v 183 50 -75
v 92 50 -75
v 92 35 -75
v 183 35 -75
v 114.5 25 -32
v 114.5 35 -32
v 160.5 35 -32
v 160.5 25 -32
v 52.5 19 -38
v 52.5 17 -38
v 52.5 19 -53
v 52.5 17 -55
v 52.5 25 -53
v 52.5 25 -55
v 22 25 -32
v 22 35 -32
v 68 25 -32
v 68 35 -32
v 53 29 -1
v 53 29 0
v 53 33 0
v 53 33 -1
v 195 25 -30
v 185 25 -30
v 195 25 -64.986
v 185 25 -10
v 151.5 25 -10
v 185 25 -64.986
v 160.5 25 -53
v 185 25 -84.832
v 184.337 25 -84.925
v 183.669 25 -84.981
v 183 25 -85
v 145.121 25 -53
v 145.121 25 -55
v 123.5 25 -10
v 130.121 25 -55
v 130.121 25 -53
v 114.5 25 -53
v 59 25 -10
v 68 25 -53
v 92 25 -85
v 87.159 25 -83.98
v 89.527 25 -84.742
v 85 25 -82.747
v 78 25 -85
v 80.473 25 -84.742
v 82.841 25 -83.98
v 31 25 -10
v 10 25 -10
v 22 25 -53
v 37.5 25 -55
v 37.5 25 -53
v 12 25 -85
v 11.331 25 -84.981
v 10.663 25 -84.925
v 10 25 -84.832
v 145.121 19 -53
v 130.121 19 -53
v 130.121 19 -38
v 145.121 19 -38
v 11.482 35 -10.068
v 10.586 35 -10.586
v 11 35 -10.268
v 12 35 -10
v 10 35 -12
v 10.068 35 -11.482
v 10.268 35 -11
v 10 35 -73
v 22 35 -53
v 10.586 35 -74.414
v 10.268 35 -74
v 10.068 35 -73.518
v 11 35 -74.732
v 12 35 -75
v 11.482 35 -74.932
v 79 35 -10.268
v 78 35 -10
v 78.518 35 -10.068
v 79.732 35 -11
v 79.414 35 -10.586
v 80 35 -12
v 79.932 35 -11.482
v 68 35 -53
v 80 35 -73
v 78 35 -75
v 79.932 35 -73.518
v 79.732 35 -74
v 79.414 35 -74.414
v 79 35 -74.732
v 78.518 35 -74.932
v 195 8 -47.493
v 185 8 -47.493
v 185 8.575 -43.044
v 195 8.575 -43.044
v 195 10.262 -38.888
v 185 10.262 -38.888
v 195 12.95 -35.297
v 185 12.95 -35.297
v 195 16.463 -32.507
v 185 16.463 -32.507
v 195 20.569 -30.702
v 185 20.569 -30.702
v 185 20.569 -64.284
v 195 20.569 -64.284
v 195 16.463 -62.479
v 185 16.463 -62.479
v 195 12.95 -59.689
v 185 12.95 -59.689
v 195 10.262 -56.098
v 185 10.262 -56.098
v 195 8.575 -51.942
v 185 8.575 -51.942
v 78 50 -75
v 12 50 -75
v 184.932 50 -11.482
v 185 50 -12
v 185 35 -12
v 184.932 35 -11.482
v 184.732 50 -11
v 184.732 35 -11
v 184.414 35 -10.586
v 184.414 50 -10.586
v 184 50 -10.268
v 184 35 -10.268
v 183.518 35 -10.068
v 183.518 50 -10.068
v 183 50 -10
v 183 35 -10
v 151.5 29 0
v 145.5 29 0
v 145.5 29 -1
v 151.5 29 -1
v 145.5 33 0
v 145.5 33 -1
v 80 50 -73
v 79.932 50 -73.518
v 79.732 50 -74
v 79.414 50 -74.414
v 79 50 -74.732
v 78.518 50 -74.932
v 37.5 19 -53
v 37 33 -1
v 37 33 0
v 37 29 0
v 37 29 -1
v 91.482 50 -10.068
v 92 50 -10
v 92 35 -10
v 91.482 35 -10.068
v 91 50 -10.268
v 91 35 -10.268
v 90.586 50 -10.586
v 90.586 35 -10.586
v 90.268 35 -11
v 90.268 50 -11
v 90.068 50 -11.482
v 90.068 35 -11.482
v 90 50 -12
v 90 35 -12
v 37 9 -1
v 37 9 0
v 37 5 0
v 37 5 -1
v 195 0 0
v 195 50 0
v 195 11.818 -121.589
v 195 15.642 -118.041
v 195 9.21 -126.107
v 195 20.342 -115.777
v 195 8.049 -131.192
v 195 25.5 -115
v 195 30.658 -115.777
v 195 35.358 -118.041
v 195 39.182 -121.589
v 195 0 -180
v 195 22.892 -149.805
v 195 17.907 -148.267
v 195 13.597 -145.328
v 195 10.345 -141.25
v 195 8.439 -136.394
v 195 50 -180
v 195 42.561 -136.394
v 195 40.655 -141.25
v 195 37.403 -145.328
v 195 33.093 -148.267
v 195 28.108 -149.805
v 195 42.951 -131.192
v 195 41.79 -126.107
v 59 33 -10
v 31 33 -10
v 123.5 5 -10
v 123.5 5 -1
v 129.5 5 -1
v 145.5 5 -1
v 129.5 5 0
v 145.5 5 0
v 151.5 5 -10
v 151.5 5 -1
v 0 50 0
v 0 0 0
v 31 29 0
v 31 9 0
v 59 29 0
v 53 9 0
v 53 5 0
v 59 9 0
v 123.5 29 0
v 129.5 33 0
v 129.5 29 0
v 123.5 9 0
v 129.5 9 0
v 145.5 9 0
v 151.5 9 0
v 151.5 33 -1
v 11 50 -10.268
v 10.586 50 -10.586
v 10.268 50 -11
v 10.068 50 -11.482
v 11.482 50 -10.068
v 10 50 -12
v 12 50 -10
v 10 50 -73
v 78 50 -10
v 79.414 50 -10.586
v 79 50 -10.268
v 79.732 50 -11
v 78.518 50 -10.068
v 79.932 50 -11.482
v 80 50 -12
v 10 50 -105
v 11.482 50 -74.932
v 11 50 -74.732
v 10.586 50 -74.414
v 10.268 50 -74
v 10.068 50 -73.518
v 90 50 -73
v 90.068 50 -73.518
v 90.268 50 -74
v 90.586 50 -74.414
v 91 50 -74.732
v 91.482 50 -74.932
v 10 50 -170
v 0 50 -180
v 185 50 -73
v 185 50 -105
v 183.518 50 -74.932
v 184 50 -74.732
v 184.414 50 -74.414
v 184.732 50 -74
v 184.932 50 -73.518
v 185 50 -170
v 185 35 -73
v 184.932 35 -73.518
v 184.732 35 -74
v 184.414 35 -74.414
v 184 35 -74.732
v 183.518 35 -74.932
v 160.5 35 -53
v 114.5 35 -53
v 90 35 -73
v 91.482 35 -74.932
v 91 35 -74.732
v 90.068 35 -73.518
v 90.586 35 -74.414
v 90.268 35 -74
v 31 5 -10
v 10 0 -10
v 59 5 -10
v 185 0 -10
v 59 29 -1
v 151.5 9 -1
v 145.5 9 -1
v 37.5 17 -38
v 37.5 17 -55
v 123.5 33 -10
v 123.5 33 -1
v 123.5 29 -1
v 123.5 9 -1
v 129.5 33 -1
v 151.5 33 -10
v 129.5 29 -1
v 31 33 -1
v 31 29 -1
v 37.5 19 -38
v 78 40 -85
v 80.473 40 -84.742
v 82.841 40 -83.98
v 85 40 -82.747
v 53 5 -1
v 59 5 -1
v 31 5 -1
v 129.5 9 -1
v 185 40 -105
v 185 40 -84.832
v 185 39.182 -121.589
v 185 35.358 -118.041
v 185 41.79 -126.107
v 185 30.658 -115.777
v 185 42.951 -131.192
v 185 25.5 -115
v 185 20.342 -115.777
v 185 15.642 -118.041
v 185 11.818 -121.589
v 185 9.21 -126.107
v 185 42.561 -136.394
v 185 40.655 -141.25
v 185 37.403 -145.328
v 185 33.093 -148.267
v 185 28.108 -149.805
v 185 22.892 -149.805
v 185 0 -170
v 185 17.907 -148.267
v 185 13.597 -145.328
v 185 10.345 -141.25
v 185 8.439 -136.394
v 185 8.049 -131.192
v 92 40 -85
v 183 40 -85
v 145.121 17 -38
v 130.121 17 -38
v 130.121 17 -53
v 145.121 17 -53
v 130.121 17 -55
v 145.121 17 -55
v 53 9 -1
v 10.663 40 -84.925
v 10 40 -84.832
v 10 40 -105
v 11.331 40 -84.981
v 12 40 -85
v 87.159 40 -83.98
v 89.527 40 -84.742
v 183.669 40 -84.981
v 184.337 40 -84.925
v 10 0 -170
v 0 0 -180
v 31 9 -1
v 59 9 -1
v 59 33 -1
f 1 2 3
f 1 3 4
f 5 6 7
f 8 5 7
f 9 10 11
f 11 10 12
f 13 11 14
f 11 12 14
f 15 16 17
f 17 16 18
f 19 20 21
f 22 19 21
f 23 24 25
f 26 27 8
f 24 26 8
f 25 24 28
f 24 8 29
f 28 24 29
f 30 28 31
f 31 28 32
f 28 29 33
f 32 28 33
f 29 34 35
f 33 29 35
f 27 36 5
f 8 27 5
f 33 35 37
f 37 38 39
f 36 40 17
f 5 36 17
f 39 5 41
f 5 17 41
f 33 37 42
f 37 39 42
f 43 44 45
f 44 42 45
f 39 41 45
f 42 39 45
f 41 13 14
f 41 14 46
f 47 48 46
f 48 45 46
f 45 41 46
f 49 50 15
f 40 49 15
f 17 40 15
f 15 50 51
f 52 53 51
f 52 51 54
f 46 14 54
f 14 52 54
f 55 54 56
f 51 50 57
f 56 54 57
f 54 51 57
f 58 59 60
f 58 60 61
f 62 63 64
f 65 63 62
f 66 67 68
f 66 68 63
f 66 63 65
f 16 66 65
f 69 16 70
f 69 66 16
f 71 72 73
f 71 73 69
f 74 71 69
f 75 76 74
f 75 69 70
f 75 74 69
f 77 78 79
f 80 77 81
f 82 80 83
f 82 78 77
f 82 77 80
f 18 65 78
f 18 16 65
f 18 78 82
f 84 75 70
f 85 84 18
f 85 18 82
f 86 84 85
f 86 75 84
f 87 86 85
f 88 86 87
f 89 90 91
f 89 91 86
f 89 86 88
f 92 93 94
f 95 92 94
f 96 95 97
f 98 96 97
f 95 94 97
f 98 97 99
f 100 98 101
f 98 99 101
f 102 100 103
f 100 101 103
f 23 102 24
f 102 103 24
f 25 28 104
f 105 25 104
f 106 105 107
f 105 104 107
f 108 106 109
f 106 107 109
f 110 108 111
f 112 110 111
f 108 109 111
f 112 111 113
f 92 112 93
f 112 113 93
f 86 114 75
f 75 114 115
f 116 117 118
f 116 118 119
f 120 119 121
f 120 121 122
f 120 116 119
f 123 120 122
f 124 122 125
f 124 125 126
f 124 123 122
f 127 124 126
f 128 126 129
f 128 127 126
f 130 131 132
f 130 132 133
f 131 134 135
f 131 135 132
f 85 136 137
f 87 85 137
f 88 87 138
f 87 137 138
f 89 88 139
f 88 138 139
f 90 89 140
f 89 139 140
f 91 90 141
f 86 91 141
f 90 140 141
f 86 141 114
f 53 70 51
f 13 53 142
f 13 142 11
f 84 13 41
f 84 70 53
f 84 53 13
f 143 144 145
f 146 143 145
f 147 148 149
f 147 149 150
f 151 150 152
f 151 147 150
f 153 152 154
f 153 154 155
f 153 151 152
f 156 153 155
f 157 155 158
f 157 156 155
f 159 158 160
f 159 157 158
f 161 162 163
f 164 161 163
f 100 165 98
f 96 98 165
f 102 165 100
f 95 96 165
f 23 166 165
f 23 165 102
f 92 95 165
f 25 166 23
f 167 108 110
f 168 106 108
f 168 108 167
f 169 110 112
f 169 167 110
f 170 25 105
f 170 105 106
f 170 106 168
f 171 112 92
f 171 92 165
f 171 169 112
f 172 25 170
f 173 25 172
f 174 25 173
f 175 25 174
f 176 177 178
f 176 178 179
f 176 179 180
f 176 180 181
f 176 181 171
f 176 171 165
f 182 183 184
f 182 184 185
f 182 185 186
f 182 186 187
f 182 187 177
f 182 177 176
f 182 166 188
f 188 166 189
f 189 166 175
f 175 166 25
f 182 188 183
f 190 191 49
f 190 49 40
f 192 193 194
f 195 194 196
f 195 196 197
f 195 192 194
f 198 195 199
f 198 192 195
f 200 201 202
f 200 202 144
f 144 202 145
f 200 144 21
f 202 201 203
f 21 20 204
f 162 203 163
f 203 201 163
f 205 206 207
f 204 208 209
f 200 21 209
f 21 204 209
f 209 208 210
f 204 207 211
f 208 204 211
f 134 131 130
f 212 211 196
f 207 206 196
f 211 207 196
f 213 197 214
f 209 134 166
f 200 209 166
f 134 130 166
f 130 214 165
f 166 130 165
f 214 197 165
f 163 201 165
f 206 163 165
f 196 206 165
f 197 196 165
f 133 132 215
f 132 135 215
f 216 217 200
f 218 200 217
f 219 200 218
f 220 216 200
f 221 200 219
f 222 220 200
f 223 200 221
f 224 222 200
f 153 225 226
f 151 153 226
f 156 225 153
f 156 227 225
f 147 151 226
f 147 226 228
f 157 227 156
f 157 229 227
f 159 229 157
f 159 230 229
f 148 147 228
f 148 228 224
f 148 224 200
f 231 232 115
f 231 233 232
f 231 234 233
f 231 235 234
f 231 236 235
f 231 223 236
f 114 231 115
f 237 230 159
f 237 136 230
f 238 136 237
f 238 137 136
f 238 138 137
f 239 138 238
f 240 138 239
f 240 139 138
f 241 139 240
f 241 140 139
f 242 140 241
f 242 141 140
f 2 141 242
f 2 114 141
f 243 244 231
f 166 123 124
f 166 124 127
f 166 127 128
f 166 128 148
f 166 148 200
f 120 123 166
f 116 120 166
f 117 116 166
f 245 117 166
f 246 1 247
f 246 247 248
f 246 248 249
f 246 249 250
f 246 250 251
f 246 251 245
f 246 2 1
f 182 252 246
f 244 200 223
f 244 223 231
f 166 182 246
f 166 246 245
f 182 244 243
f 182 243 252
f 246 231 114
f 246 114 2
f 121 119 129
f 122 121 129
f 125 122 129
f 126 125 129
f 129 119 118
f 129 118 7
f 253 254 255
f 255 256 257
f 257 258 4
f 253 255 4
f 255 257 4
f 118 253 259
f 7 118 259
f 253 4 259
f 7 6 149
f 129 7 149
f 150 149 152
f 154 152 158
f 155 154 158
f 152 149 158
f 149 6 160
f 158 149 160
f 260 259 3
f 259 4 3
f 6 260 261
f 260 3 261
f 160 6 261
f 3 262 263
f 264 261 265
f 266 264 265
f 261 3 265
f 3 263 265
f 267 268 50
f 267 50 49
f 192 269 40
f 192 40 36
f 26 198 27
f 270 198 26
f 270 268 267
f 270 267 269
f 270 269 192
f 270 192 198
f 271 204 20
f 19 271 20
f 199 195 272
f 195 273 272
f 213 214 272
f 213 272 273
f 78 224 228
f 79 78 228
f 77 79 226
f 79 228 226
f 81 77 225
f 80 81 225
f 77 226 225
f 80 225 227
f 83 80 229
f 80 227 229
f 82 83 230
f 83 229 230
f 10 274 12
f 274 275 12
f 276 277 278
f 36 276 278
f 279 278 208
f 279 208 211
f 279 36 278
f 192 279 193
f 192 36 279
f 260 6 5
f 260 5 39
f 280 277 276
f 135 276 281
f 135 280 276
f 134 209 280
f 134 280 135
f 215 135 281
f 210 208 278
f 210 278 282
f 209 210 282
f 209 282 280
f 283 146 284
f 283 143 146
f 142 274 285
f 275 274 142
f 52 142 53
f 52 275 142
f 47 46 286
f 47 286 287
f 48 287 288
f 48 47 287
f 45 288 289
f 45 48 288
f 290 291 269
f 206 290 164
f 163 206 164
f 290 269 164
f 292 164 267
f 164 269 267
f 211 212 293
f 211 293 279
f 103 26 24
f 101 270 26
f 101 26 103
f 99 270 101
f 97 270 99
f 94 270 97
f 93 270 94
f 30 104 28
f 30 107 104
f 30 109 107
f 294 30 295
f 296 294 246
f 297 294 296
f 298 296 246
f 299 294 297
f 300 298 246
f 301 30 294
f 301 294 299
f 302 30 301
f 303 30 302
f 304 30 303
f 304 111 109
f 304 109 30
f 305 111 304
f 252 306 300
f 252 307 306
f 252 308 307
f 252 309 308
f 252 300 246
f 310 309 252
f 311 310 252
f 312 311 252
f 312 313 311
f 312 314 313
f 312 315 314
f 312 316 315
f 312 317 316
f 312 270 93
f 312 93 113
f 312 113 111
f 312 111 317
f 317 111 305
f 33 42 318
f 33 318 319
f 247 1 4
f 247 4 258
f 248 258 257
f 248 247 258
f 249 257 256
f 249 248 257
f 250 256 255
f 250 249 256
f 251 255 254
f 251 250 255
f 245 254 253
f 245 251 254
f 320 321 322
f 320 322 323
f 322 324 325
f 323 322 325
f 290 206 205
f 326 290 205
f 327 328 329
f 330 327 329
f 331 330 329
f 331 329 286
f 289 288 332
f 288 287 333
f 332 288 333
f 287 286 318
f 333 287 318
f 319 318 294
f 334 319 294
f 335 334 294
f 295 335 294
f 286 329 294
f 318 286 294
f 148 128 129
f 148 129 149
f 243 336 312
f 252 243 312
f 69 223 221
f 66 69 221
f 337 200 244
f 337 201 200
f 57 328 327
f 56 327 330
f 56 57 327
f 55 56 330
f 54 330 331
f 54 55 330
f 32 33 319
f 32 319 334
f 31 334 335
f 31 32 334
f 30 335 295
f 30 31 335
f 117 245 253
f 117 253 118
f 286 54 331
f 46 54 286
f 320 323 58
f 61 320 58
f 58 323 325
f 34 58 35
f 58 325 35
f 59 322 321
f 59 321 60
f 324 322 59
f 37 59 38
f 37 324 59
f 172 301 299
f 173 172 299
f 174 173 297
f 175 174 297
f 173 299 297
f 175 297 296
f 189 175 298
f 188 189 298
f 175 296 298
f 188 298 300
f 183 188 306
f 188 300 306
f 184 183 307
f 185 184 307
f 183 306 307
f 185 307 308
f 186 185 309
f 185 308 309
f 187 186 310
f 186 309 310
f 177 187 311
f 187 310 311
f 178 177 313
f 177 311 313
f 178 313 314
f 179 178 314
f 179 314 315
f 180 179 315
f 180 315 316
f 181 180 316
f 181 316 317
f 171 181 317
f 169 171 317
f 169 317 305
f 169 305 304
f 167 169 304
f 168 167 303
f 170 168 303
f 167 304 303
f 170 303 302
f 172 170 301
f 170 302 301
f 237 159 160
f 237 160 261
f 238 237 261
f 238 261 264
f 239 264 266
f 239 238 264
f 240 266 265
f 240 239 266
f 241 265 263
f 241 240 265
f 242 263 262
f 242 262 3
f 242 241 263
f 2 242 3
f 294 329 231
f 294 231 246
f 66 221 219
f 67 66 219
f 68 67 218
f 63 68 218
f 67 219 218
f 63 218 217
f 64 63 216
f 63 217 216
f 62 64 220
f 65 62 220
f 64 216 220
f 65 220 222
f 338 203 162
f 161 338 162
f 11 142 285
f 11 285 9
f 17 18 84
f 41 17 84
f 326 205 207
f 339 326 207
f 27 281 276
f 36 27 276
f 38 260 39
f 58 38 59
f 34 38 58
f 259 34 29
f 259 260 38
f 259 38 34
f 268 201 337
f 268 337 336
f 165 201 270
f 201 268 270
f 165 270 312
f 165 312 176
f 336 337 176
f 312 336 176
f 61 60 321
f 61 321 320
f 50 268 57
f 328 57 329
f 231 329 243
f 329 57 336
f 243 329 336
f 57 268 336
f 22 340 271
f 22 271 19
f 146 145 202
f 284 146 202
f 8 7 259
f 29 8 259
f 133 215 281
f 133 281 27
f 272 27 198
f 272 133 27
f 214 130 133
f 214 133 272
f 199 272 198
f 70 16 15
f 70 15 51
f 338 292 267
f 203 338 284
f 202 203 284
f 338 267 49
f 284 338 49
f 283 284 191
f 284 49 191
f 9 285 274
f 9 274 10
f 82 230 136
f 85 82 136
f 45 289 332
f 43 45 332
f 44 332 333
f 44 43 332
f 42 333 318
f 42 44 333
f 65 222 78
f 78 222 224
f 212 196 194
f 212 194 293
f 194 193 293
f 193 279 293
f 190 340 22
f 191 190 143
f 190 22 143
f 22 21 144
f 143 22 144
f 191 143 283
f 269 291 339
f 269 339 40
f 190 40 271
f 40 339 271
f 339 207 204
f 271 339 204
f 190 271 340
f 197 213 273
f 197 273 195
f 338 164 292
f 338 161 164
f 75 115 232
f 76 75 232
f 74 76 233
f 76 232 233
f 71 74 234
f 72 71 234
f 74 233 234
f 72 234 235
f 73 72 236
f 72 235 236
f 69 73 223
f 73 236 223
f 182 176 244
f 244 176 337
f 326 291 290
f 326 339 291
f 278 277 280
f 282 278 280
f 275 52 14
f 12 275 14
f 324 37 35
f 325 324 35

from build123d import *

# Parameters (mm, degrees)
SKETCH2_W            = 195
SKETCH2_H            = 180
BOSS_EXTRUDE1_DEPTH  = 50
CUT_EXTRUDE1_DEPTH   = 15
BOSS_EXTRUDE4_DEPTH  = 50
SKETCH14_W           = 70
SKETCH14_H           = 65
SKETCH14_W_2         = 95
BOSS_EXTRUDE8_DEPTH  = 35
SHELL2_OUTLINE_W     = 175
SHELL2_OUTLINE_H     = 65
SHELL2_DEPTH         = 75
SHELL2_2_OUTLINE_W   = 175
SHELL2_2_OUTLINE_H   = 95
SHELL2_2_DEPTH       = 25
SHELL2_START         = 25
SHELL2_3_DEPTH       = 15
SKETCH15_W           = 46
SKETCH15_H           = 21
CUT_EXTRUDE2_DEPTH   = 10
SKETCH16_W           = 46
SKETCH16_H           = 21
CUT_EXTRUDE3_DEPTH   = 10
SKETCH17_W           = 7.5
SKETCH17_H           = 8
BOSS_EXTRUDE10_DEPTH = 2
SKETCH18_W           = 15
SKETCH18_H           = 2
BOSS_EXTRUDE11_DEPTH = 15
CUT_EXTRUDE5_DEPTH   = 10
CUT_EXTRUDE6_DEPTH   = 9
SKETCH25_W           = 7.379331851
SKETCH25_H           = 8
SKETCH25_W_2         = 7.620668149
BOSS_EXTRUDE12_DEPTH = 2
SKETCH26_W           = 15
SKETCH26_H           = 2
BOSS_EXTRUDE13_DEPTH = 15
SKETCH27_R           = 17.5
CUT_EXTRUDE10_DEPTH  = 10
BOSS_EXTRUDE14_START = -10
BOSS_EXTRUDE14_DEPTH = 10


# Read off the part's stored shape, not the designer's step: Shell2
with BuildPart() as part:
    # Sketch2 → Boss-Extrude1 (new body)
    with BuildSketch(Plane(origin=(0, 0, 0), x_dir=(1, 0, 0), z_dir=(0, 1, 0))):
        with Locations((97.5, 90)):
            Rectangle(SKETCH2_W, SKETCH2_H)
    extrude(amount=BOSS_EXTRUDE1_DEPTH)

    # Sketch3 → Cut-Extrude1 (cut)
    with BuildSketch(Plane(origin=(0, 50, 0), x_dir=(1, 0, 0), z_dir=(0, 1, 0))):
        with BuildLine():
            Line((90, 12), (90, 73))
            ThreePointArc((90, 73), (90.585786438, 74.414213562), (92, 75))
            Line((92, 75), (183, 75))
            ThreePointArc((183, 75), (184.414213562, 74.414213562), (185, 73))
            Line((185, 73), (185, 12))
            ThreePointArc((185, 12), (184.414213562, 10.585786438), (183, 10))
            Line((183, 10), (92, 10))
            ThreePointArc((92, 10), (90.585786438, 10.585786438), (90, 12))
        make_face()
        with BuildLine():
            Line((12, 10), (78, 10))
            ThreePointArc((78, 10), (79.414213562, 10.585786438), (80, 12))
            Line((80, 12), (80, 73))
            ThreePointArc((80, 73), (79.414213562, 74.414213562), (78, 75))
            Line((78, 75), (12, 75))
            ThreePointArc((12, 75), (10.585786438, 74.414213562), (10, 73))
            Line((10, 73), (10, 12))
            ThreePointArc((10, 12), (10.585786438, 10.585786438), (12, 10))
        make_face()
    extrude(amount=-CUT_EXTRUDE1_DEPTH, mode=Mode.SUBTRACT)

    # Sketch6 → Boss-Extrude4 (add)
    with BuildSketch(Plane(origin=(0, 50, 0), x_dir=(1, 0, 0), z_dir=(0, 1, 0))):
        Polygon((0, 180), (185, 180), (195, 180), (195, 95), (185, 95), (0, 95), align=None)
        with BuildLine():
            Line((185, 168), (185, 107))
            ThreePointArc((185, 107), (184.414213562, 105.585786438), (183, 105))
            Line((183, 105), (92, 105))
            ThreePointArc((92, 105), (90.585786438, 105.585786438), (90, 107))
            Line((90, 107), (90, 168))
            ThreePointArc((90, 168), (90.585786438, 169.414213562), (92, 170))
            Line((92, 170), (183, 170))
            ThreePointArc((183, 170), (184.414213562, 169.414213562), (185, 168))
        make_face(mode=Mode.SUBTRACT)
        with BuildLine():
            Line((80, 107), (80, 168))
            ThreePointArc((80, 168), (79.414213562, 169.414213562), (78, 170))
            Line((78, 170), (12, 170))
            ThreePointArc((12, 170), (10.585786438, 169.414213562), (10, 168))
            Line((10, 168), (10, 107))
            ThreePointArc((10, 107), (10.585786438, 105.585786438), (12, 105))
            Line((12, 105), (78, 105))
            ThreePointArc((78, 105), (79.414213562, 105.585786438), (80, 107))
        make_face(mode=Mode.SUBTRACT)
    extrude(amount=BOSS_EXTRUDE4_DEPTH)

    # Sketch14 → Boss-Extrude8 (add)
    with BuildSketch(Plane(origin=(0, 50, 0), x_dir=(1, 0, 0), z_dir=(0, 1, 0))):
        with Locations((45, 137.5)):
            Rectangle(SKETCH14_W, SKETCH14_H)
        with Locations((137.5, 137.5)):
            Rectangle(SKETCH14_W_2, SKETCH14_H)
    extrude(amount=BOSS_EXTRUDE8_DEPTH)

    # Shell2 outline → Shell2 (cut)
    with BuildSketch(Plane(origin=(0, 0, 0), x_dir=(1, 0, 0), z_dir=(0, 1, 0))):
        with Locations((97.5, 137.5)):
            Rectangle(SHELL2_OUTLINE_W, SHELL2_OUTLINE_H)
    extrude(amount=SHELL2_DEPTH, mode=Mode.SUBTRACT)

    # Shell2 2 outline → Shell2 2 (cut)
    with BuildSketch(Plane(origin=(0, 0, 0), x_dir=(1, 0, 0), z_dir=(0, 1, 0))):
        with Locations((97.5, 57.5)):
            Rectangle(SHELL2_2_OUTLINE_W, SHELL2_2_OUTLINE_H)
    extrude(amount=SHELL2_2_DEPTH, mode=Mode.SUBTRACT)

    # Shell2 3 outline → Shell2 3 (cut)
    with BuildSketch(Plane(origin=(0, 0, 0), x_dir=(1, 0, 0), z_dir=(0, 1, 0)).offset(SHELL2_START)):
        with BuildLine():
            Line((10, 105), (10, 84.832159566))
            ThreePointArc((10, 84.832159566), (10.996484877, 84.957966273), (12, 85))
            Line((12, 85), (78, 85))
            ThreePointArc((78, 85), (81.676851089, 84.422817781), (85, 82.746794345))
            ThreePointArc((85, 82.746794345), (88.323148911, 84.422817781), (92, 85))
            Line((92, 85), (183, 85))
            ThreePointArc((183, 85), (184.003515123, 84.957966273), (185, 84.832159566))
            Line((185, 84.832159566), (185, 105))
            Line((185, 105), (10, 105))
        make_face()
    extrude(amount=SHELL2_3_DEPTH, mode=Mode.SUBTRACT)

    # SurfaceCut2
    split(bisect_by=Plane(origin=(0, 50, 0), x_dir=(1, 0, 0), z_dir=(0, 1, 0)), keep=Keep.BOTTOM)

    # Sketch15 → Cut-Extrude2 (cut)
    with BuildSketch(Plane(origin=(0, 35, 0), x_dir=(1, 0, 0), z_dir=(0, 1, 0))):
        with Locations((45, 42.5)):
            Rectangle(SKETCH15_W, SKETCH15_H)
    extrude(amount=-CUT_EXTRUDE2_DEPTH, mode=Mode.SUBTRACT)

    # Sketch16 → Cut-Extrude3 (cut)
    with BuildSketch(Plane(origin=(0, 35, 0), x_dir=(1, 0, 0), z_dir=(0, 1, 0))):
        with Locations((137.5, 42.5)):
            Rectangle(SKETCH16_W, SKETCH16_H)
    extrude(amount=-CUT_EXTRUDE3_DEPTH, mode=Mode.SUBTRACT)

    # Sketch17 → Boss-Extrude10 (add)
    with BuildSketch(Plane.XY.offset(-53)):
        with Locations((48.75, 21)):
            Rectangle(SKETCH17_W, SKETCH17_H)
        with Locations((41.25, 21)):
            Rectangle(SKETCH17_W, SKETCH17_H)
    extrude(amount=-BOSS_EXTRUDE10_DEPTH)

    # Sketch18 → Boss-Extrude11 (add)
    with BuildSketch(Plane.XY.offset(-53)):
        with Locations((45, 18)):
            Rectangle(SKETCH18_W, SKETCH18_H)
    extrude(amount=BOSS_EXTRUDE11_DEPTH)

    # Sketch20 → Cut-Extrude5 (cut)
    with BuildSketch(Plane.XY):
        Polygon((37, 29), (31, 29), (31, 9), (37, 9), (37, 5), (45, 5), (53, 5), (53, 9), (59, 9), (59, 19), (59, 29), (53, 29), (53, 33), (43.658923735, 33), (37, 33), align=None)
    cut_extrude5 = extrude(amount=-CUT_EXTRUDE5_DEPTH, mode=Mode.SUBTRACT)

    # Sketch21 → Cut-Extrude6 (cut)
    with BuildSketch(Plane(origin=(0, 0, -10), x_dir=(-1, 0, 0), z_dir=(0, 0, -1))):
        Polygon((-53, 5), (-31, 5), (-31, 12.573974865), (-31, 33), (-52.681459042, 33), (-59, 33), (-59, 15.767843478), (-59, 5), align=None)
    cut_extrude6 = extrude(amount=-CUT_EXTRUDE6_DEPTH, mode=Mode.SUBTRACT)

    # Sketch25 → Boss-Extrude12 (add)
    with BuildSketch(Plane.XY.offset(-53)):
        with Locations((133.810334075, 21)):
            Rectangle(SKETCH25_W, SKETCH25_H)
        with Locations((141.310334075, 21)):
            Rectangle(SKETCH25_W_2, SKETCH25_H)
    extrude(amount=-BOSS_EXTRUDE12_DEPTH)

    # Sketch26 → Boss-Extrude13 (add)
    with BuildSketch(Plane.XY.offset(-53)):
        with Locations((137.620668149, 18)):
            Rectangle(SKETCH26_W, SKETCH26_H)
    extrude(amount=BOSS_EXTRUDE13_DEPTH)

    # Mirror4: Cut-Extrude5, Cut-Extrude6 across plane
    add(cut_extrude5.mirror(Plane(origin=(91.25, 0, 0), x_dir=(0, 0, 1), z_dir=(1, 0, 0))), mode=Mode.SUBTRACT)
    add(cut_extrude6.mirror(Plane(origin=(91.25, 0, 0), x_dir=(0, 0, 1), z_dir=(1, 0, 0))), mode=Mode.SUBTRACT)

    # Sketch27 → Cut-Extrude10 (cut)
    with BuildSketch(Plane.ZY.offset(-185)):
        with Locations((-132.5, 25.5)):
            Circle(SKETCH27_R)
        with BuildLine():
            ThreePointArc((-64.985711369, 25), (-59.689166602, 12.950099602), (-47.492855685, 8))
            ThreePointArc((-47.492855685, 8), (-35.296544767, 12.950099602), (-30, 25))
            Line((-30, 25), (-64.985711369, 25))
        make_face()
        with BuildLine():
            Line((-64.985711369, 25), (-30, 25))
            ThreePointArc((-30, 25), (-29.994641855, 25.249974481), (-29.992855685, 25.5))
            ThreePointArc((-29.992855685, 25.5), (-47.742881204, 42.99821383), (-64.985711369, 25))
        make_face()
    extrude(amount=-CUT_EXTRUDE10_DEPTH, mode=Mode.SUBTRACT)

    # Sketch28 → Boss-Extrude14 (add)
    with BuildSketch(Plane(origin=(195, 0, 0), x_dir=(0, 0, -1), z_dir=(1, 0, 0)).offset(BOSS_EXTRUDE14_START)):
        with BuildLine():
            Line((30, 25), (64.985711369, 25))
            ThreePointArc((64.985711369, 25), (47.492855685, 43), (30, 25))
        make_face()
    extrude(amount=BOSS_EXTRUDE14_DEPTH)


solid = part.part
